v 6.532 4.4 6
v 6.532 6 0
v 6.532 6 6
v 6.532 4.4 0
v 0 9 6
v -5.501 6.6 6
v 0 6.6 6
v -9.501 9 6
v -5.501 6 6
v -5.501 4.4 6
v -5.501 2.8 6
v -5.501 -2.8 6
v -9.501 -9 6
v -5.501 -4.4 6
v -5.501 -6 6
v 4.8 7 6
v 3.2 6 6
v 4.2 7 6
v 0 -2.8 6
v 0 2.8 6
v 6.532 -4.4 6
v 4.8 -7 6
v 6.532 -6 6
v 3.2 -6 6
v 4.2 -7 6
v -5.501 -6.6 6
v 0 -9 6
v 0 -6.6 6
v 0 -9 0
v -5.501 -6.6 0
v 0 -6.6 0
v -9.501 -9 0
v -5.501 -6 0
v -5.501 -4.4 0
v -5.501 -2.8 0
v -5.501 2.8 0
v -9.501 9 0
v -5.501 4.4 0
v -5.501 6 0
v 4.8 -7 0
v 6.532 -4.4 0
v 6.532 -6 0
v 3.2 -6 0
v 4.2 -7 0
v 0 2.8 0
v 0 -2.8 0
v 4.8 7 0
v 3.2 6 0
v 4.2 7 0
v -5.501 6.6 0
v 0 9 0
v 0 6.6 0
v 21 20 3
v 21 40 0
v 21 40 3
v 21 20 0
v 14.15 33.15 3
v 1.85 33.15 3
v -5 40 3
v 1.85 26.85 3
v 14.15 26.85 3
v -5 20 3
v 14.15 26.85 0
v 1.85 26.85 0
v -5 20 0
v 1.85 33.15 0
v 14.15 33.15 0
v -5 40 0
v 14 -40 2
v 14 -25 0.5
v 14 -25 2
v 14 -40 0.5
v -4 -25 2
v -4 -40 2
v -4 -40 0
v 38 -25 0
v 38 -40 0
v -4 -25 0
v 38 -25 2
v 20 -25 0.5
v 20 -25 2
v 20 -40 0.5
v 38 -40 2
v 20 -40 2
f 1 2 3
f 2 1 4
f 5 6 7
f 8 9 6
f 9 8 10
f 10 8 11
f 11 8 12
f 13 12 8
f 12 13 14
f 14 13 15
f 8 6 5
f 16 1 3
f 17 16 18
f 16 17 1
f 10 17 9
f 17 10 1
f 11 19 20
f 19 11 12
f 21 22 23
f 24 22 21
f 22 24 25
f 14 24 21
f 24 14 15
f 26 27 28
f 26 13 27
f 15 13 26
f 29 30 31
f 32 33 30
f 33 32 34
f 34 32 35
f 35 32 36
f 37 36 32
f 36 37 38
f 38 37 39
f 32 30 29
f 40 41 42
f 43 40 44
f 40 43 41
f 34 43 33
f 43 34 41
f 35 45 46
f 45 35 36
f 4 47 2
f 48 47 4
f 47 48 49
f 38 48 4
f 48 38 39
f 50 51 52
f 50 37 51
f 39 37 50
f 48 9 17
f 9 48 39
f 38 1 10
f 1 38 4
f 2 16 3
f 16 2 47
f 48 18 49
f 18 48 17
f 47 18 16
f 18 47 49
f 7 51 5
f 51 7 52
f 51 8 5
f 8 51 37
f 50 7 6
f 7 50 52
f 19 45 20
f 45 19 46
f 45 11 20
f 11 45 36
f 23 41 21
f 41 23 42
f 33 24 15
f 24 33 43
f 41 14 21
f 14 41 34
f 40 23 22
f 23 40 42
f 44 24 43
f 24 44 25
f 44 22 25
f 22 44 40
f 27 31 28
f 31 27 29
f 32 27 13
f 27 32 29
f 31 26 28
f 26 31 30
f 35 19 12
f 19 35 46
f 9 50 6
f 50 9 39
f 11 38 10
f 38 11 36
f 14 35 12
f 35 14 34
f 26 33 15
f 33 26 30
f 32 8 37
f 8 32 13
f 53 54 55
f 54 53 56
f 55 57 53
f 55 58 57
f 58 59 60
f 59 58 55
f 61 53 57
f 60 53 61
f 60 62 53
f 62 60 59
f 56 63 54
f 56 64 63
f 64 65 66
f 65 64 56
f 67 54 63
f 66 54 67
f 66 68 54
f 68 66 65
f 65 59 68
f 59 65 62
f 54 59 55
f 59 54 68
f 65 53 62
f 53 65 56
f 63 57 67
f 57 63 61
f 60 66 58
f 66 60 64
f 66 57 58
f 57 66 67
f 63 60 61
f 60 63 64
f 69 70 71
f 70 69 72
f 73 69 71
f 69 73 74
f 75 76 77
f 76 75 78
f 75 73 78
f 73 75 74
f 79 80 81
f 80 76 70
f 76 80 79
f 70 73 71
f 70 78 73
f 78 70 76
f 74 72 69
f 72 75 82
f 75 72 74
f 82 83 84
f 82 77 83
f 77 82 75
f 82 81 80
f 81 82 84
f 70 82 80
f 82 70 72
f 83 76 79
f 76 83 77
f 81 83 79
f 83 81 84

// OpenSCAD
// parts: card
// Snap fits and a living hinge that check their own strain: a two-arm clip that clicks through a slot in a plate,
// and a living-hinge sample. Print the card, push the clip through the plate's slot (it clicks, and comes out
// with a firm pull because the return face is 45 degrees), and fold the hinge a few times.
// The numbers come from the 3d-print-designer skill (functional-parts.md):
//   strain at the arm root  e = 1.5 * t * y / L^2      (t thickness, y hook depth = deflection, L root to hook)
//   design strain           about 2% for PLA, about 3% for PETG
//   arms print flat and bend within the layer, never across it
//   living hinge            0.3 to 0.8 mm thick, at least 5 mm long, PETG/PP/nylon (PLA cracks in a few hundred folds)
// The asserts refuse a design that breaks these, so a wrong size stops here and not as a snapped arm.
// Reuse: use <snap-fit.scad>, then snap_clip(...), snap_slot(...) and living_hinge(...).
//   part = "card"   clip, plate and hinge sample on one plate ("all" previews the same)
part = "card";
$fn = 48;

material = "PETG";                  // PLA or PETG; any other material needs strain_limit set by hand
strain_limit = material == "PLA" ? 0.02 : material == "PETG" ? 0.03 : undef;
slide_fit = 0.3;                    // replace with the lines `python tools/fit.py scad` prints

// clip arm
t = 1.6;            // arm thickness at the root (bending direction)
w = 6;              // arm width (the part's height on the bed)
y = 1.0;            // hook depth: how far each arm bends while going through
lead = 30;          // lead-in angle, degrees: lower pushes in more easily
ret = 45;           // return angle: 45 comes out with a firm pull, 90 never comes out
P = 3;              // plate thickness the clip goes through
S = 12;             // outer span of the two arms (the slot is this plus slide_fit)
base = 4;           // the clip's head behind the arm roots
play = 0.2;         // axial play so the hook clears the plate's back face
relief = 0.6;       // gap each side of an arm where it runs back into the head, so it flexes over its whole length
margin = 0.85;      // the arm is sized to this share of the strain limit

function strain(t, y, L) = 1.5 * t * y / (L * L);

// x = 0 is the shoulder that stops against the plate; the arm roots at x = -R, inside the head, so its flexing
// length (root to hook) is long enough for the strain limit even through a thin plate. y outward from the arm's face.
module hook_arm(R, L, t, w, y, lead, ret, x_r) {
  x_c = x_r + (ret >= 89.9 ? 0.01 : y / tan(ret));            // top of the return face
  x_f = x_c + 0.6;                                             // a short flat
  translate([-R - 1, -t, 0]) cube([R + 1 + L, t, w]);                      // 1 mm into the head, so arm and head are one body
  linear_extrude(w) polygon([[x_r, 0], [x_c, y], [x_f, y], [L, 0]]);
}

module snap_clip(t = t, w = w, y = y, lead = lead, ret = ret, P = P, S = S, base = base, play = play) {
  x_r = P + play;
  x_c = x_r + (ret >= 89.9 ? 0 : y / tan(ret));
  L = x_c + 0.6 + y / tan(lead);
  R = max(1, sqrt(1.5 * t * y / (margin * strain_limit)) - x_c);   // root this far behind the shoulder
  e = strain(t, y, R + x_c);
  assert(strain_limit != undef, str("no design strain known for ", material, ": set strain_limit"));
  assert(e <= strain_limit, str("arm strain ", round(e * 1000) / 10, "% is over ", strain_limit * 100,
                                "% for ", material, ": make the arm longer or thinner, or the hook shallower"));
  assert(S - 2 * t >= 2 * y + 0.5, "the arms would hit each other before the hooks clear the slot");
  assert(relief > slide_fit / 2, "the shoulders must sit outside the slot to stop against the plate");
  echo(clip_strain_pct = round(e * 1000) / 10, limit_pct = strain_limit * 100, flexing_length = R + x_c);
  translate([-R - base, -(S + 6) / 2, 0]) cube([base, S + 6, w]);                        // the head, where the arms root
  for (m = [0, 1]) mirror([0, m, 0]) {
    translate([0, S / 2, 0]) hook_arm(R, L, t, w, y, lead, ret, x_r);
    translate([-R - 0.01, S / 2 + relief, 0]) cube([R + 0.01, (S + 6) / 2 - S / 2 - relief, w]);   // shoulder outside the arm
    translate([-R - 0.01, 0, 0]) cube([R + 0.01, S / 2 - t - y - relief, w]);                   // core inside, clear of the bend
  }
}

module snap_slot(P = P, S = S, w = w, c = slide_fit) difference() {   // the plate the clip clicks through
  translate([-(S + 14) / 2, -(w + 14) / 2, 0]) cube([S + 14, w + 14, P]);
  translate([-(S + c) / 2, -(w + c) / 2, -1]) cube([S + c, w + c, P + 2]);
}

module living_hinge(len = 6, width = 15, ht = 0.5, leaf = [18, 2]) {
  assert(material != "PLA", "a living hinge in PLA cracks after a few hundred folds: use PETG, PP or nylon");
  assert(ht >= 0.3 && ht <= 0.8, "living hinge thickness: 0.3 to 0.8 mm");
  assert(len >= 5, "living hinge: at least 5 mm long, so the bend spreads out");
  cube([leaf[0], width, leaf[1]]);
  translate([leaf[0], 0, 0]) cube([len, width, ht]);            // on the bed: its lines run across the fold
  translate([leaf[0] + len, 0, 0]) cube([leaf[0], width, leaf[1]]);
}

module card() {
  snap_clip();
  translate([8, 30, 0]) snap_slot();
  if (material != "PLA") translate([-base, -40, 0]) living_hinge();
  else echo("no living hinge sample: PLA cracks at a living hinge");
}

if (part == "card" || part == "all") color("#1f1f22") card();
